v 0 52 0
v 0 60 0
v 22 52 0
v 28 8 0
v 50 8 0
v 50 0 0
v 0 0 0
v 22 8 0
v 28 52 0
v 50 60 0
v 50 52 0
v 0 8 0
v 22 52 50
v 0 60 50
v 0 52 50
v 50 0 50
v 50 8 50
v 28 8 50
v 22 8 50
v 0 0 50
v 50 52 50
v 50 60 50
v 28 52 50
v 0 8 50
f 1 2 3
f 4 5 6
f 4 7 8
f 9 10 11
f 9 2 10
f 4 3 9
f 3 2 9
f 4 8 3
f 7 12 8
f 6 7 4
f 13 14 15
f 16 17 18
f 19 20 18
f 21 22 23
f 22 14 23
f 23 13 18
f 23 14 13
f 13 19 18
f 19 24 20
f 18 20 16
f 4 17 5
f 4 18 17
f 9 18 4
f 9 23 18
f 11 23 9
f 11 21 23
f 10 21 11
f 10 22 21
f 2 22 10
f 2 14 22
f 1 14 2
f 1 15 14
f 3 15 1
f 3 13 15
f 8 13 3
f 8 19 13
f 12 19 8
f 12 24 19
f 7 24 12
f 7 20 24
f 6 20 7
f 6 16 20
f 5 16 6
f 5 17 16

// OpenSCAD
$fn = 32;

// ----------------------------------------------------------------------
// Structural section: ibeam 50 x 60 mm
// ----------------------------------------------------------------------

// --- parameters (mm) ---
sec_w = 50;               // section width, X
sec_h = 60;               // section height, Y
flange_t = 8;             // flange thickness
web_t = 6;                // web thickness
plate_t = 50;             // cut length, Z (extrusion height)

profile = [[0, 0], [50, 0], [50, 8], [28, 8], [28, 52], [50, 52], [50, 60], [0, 60], [0, 52], [22, 52], [22, 8], [0, 8]];  // primary outline, 12 points, counter clockwise

// --- the one profile operation ---
linear_extrude(height = plate_t) polygon(points = profile);
